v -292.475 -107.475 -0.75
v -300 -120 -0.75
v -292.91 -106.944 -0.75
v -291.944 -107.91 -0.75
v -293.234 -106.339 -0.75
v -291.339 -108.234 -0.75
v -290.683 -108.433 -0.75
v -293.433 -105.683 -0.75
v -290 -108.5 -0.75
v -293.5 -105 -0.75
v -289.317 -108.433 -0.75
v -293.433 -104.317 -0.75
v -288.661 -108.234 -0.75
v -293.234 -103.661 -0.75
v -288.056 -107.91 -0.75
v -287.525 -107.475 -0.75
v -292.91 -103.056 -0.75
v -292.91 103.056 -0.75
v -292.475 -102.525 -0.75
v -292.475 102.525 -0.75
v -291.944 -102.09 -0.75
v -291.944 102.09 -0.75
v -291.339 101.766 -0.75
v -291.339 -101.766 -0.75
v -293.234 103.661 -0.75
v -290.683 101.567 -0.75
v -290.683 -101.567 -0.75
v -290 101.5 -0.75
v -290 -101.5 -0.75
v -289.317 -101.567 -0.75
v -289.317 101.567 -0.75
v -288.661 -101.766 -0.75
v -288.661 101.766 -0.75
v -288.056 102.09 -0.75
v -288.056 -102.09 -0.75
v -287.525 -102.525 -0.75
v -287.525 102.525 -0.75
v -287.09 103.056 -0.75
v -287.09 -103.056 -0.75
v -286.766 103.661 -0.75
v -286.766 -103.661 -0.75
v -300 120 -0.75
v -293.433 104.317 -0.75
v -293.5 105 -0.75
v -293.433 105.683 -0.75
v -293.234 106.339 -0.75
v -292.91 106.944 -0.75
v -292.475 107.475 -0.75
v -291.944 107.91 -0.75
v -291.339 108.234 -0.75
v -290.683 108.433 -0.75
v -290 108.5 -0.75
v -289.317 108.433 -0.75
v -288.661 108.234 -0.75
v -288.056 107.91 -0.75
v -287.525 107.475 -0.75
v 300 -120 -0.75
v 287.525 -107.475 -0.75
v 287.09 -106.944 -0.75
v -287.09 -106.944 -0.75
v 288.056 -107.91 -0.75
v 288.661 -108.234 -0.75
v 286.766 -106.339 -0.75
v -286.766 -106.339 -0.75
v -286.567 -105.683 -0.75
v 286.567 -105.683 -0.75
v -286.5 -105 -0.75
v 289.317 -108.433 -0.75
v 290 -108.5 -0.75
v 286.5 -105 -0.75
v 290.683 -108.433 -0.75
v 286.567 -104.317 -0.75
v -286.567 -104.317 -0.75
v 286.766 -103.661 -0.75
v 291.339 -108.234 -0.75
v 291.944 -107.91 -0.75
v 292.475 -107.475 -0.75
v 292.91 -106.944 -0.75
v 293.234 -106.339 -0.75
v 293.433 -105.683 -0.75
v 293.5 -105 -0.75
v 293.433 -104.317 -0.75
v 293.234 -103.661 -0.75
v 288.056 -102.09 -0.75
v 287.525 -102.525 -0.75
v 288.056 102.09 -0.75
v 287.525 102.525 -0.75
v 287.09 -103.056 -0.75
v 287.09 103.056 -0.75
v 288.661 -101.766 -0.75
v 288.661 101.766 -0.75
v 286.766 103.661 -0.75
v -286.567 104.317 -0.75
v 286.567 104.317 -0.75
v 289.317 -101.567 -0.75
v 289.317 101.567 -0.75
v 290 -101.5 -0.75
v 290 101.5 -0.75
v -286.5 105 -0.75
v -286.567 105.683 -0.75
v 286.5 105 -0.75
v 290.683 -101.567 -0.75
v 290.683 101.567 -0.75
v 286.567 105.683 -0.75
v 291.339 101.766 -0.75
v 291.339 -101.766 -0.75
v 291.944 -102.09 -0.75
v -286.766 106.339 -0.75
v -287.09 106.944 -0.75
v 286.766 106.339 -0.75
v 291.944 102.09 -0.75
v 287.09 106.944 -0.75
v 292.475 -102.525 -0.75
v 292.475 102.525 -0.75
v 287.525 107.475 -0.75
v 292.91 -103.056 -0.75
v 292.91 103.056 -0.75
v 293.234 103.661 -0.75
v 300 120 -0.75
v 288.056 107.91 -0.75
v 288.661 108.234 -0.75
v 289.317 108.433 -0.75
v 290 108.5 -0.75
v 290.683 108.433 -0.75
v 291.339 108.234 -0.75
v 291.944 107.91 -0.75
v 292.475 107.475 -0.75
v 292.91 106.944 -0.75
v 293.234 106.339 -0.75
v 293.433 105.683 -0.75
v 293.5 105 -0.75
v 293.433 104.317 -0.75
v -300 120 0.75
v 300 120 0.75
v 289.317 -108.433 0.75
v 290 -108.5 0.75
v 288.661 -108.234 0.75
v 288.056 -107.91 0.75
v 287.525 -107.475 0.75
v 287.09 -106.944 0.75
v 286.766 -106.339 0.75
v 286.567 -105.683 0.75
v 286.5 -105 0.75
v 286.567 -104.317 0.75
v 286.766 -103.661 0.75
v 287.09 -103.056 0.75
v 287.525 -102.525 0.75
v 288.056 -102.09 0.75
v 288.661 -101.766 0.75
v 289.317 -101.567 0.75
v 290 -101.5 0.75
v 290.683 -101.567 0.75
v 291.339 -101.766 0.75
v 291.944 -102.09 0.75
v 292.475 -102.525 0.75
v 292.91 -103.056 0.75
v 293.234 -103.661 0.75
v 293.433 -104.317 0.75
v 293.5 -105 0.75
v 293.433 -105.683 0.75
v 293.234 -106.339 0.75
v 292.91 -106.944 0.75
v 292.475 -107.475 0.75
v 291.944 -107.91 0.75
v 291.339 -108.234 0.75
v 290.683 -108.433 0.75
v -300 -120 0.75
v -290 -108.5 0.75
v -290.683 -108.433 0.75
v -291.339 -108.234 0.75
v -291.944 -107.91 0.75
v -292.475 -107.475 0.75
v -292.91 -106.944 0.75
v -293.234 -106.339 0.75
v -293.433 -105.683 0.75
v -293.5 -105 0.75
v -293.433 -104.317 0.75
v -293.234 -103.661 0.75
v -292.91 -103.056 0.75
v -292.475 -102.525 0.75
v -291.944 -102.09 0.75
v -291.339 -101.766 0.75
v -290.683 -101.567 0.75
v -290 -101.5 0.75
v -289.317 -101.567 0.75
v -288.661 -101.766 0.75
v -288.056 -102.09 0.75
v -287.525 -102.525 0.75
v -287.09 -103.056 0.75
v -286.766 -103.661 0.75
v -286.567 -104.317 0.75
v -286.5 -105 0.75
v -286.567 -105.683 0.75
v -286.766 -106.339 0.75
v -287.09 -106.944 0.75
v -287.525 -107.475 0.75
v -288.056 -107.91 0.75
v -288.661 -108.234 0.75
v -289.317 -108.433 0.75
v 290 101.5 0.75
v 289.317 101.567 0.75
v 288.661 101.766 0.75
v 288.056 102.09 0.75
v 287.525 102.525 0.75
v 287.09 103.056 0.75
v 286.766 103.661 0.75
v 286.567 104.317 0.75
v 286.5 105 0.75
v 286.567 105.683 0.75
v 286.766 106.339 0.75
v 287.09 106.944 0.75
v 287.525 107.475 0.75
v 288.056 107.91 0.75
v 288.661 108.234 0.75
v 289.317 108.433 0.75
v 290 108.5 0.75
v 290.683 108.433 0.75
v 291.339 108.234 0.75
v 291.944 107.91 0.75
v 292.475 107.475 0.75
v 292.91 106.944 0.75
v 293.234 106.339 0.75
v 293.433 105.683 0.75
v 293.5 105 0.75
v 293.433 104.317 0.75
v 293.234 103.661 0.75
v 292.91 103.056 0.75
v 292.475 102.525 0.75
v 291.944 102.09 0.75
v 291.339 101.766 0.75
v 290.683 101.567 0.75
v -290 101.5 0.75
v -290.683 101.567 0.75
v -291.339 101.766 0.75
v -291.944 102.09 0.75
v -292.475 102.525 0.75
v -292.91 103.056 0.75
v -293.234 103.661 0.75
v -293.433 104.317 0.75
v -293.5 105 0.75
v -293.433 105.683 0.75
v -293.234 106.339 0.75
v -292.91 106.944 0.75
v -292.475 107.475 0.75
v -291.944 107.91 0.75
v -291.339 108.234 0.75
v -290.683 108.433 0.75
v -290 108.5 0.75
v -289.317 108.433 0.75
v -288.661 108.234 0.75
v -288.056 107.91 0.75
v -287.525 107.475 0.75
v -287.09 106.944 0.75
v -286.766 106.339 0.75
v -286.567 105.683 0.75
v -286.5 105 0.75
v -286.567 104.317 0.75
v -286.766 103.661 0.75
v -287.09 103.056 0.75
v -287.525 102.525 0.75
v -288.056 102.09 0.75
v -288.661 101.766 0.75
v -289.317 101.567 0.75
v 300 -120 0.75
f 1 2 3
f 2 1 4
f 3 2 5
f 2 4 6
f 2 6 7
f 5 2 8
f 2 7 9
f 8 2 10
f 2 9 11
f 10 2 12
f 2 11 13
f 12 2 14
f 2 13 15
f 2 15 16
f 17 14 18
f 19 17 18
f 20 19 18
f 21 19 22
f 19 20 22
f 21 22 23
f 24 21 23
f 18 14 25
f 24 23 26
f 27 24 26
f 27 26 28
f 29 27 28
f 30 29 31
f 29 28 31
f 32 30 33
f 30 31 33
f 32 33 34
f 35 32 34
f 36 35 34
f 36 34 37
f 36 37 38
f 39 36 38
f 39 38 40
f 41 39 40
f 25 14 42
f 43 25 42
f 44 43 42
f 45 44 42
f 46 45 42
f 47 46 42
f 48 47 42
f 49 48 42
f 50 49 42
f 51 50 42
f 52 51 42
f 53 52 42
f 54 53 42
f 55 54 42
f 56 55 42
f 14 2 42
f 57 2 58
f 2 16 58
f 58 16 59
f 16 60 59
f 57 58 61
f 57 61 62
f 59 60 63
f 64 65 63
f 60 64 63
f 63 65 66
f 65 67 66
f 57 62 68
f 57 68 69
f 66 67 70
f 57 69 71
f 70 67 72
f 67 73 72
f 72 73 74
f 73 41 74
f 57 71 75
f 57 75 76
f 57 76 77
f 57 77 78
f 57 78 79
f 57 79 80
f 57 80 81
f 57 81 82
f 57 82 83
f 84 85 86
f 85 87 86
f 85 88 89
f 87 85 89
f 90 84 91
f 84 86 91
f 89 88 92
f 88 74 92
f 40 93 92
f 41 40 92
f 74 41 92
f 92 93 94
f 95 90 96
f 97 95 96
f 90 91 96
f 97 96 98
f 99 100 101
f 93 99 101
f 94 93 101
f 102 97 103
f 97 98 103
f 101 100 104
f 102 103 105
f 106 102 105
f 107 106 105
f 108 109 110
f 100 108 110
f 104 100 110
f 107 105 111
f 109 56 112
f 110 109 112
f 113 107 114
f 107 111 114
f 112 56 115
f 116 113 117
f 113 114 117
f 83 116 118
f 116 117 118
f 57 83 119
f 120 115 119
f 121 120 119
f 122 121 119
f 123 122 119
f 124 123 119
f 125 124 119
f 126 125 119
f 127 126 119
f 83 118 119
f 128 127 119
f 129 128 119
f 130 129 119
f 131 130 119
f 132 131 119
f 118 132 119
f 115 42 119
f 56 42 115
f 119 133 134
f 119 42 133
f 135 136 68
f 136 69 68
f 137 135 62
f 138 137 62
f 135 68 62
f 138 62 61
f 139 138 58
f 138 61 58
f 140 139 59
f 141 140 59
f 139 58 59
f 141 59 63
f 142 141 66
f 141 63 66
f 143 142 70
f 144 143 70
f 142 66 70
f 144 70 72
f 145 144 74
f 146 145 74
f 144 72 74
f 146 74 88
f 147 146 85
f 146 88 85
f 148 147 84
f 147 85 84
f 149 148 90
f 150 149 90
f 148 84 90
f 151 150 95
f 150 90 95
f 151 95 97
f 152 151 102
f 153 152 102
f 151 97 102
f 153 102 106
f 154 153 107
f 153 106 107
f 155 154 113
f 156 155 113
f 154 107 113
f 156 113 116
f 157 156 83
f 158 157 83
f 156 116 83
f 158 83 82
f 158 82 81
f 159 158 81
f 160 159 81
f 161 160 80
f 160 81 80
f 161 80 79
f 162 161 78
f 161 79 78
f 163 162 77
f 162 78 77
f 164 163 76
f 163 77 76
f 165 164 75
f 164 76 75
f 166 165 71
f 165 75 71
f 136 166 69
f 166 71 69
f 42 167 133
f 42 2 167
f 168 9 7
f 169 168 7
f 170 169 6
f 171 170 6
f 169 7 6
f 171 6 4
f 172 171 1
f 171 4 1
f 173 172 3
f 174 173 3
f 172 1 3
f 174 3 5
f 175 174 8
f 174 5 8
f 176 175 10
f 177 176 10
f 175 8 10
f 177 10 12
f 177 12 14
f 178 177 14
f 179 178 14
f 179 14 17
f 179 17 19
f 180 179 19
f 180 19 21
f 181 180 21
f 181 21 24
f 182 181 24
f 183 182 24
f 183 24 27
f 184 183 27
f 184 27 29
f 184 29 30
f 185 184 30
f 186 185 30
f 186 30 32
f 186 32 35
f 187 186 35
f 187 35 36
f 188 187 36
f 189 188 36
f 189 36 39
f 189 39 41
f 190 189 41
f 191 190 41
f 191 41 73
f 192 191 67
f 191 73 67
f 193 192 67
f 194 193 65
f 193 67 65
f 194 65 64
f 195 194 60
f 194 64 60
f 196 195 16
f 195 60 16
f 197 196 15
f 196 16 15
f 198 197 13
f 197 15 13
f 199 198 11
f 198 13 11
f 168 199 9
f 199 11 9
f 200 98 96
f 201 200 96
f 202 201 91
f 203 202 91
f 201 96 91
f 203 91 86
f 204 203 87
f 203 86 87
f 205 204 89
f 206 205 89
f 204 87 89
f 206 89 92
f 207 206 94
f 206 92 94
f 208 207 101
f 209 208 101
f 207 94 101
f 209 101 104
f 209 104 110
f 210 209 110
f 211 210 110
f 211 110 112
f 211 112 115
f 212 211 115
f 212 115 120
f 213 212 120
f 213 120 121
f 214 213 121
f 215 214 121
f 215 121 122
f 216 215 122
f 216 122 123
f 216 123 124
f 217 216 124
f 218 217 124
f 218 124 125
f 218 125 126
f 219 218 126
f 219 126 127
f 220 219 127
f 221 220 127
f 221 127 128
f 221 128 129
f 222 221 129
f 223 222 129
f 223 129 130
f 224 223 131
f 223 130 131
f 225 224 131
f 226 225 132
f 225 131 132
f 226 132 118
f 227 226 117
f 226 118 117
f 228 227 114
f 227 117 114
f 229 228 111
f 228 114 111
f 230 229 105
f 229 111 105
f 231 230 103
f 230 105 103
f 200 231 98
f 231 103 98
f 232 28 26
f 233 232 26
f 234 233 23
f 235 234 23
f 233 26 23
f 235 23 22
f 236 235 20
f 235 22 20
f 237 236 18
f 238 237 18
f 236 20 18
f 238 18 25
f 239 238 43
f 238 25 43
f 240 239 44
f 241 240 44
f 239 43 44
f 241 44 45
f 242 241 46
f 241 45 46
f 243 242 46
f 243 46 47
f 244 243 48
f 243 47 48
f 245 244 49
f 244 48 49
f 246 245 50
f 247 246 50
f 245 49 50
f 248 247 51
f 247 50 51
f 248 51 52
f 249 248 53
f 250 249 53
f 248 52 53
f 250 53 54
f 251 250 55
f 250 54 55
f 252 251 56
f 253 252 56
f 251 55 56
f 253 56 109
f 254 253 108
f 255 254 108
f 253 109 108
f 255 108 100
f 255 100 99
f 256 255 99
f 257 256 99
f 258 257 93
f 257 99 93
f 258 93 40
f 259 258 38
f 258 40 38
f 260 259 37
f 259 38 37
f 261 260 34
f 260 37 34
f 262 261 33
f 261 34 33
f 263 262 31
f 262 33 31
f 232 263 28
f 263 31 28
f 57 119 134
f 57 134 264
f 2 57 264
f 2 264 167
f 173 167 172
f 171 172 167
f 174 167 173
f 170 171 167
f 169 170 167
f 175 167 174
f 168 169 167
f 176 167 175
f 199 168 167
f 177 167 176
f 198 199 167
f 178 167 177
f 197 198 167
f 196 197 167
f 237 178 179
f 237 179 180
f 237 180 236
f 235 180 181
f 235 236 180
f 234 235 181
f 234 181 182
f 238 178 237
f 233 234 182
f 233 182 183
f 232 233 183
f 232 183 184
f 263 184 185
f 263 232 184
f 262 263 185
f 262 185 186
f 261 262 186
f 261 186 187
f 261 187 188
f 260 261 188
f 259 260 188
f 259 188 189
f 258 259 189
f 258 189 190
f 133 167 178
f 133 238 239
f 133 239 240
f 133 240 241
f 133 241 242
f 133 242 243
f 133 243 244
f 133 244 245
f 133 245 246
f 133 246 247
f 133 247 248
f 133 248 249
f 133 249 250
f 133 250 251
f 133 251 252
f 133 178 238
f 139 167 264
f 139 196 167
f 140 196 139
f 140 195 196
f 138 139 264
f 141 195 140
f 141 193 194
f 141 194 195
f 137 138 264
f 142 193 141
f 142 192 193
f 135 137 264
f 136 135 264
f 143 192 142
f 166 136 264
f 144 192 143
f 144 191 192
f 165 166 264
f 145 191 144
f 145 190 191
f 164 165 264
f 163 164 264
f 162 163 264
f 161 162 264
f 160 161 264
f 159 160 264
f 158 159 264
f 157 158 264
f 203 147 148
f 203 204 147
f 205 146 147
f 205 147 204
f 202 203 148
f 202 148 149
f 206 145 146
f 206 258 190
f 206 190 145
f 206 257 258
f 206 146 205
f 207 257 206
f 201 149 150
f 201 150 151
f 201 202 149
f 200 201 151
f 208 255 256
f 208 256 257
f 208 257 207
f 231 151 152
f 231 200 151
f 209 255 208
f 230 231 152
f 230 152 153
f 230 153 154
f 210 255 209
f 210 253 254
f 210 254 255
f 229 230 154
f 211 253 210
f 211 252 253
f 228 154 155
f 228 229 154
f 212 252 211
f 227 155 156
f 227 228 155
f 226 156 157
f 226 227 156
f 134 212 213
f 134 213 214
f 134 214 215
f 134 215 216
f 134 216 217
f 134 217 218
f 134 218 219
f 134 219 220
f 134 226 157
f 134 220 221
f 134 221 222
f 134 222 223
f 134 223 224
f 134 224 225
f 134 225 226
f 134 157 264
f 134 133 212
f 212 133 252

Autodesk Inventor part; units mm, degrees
ref_plane "YZ Plane" through (0, 0, 0) normal (1, 0, 0) x (0, 1, 0)
ref_plane "XZ Plane" through (0, 0, 0) normal (0, 1, 0) x (-1, 0, 0)
ref_plane "XY Plane" through (0, 0, 0) normal (0, 0, 1) x (1, 0, 0)
sketch "Sketch1" plane through (0, 0, 0) normal (0, 0, 1) x (1, 0, 0)
  line L0 (-300, 120) -> (300, 120)
  line L1 (300, 120) -> (300, -120)
  line L2 (300, -120) -> (-300, -120)
  line L3 (-300, -120) -> (-300, 120)
  line L4 (-300, 120) -> (300, -120) construction
  line L5 (300, 120) -> (-300, -120) construction
  point P0 (0, 0)
  dimension "d0" = 600
  dimension "d1" = 240
extrude "Plate1" add sketch "Sketch1" along normal mid plane 1.5
sketch "Sketch2" plane through (0, 0, 0.75) normal (0, 0, 1) x (1, 0, 0)
  line L0 (-300, 120) -> (300, 120) projected
  line L1 (-300, -120) -> (-300, 120) projected
  line L2 (300, 120) -> (300, -120) projected
  line L3 (300, -120) -> (-300, -120) projected
  point P0 (0, 0)
  point P1 (-290, 105)
  point P2 (290, 105)
  point P3 (290, -105)
  point P4 (-290, -105)
  dimension "d3" = 15
  dimension "d4" = 10
  dimension "d5" = 10
  dimension "d6" = 15
hole "Hole1" at (-290, 105, 0.75) at (290, 105, 0.75) at (290, -105, 0.75) at (-290, -105, 0.75) direction (0, 0, -1) diameter 7 end through all
equation "\"d12\" = Thickness"
equation "\"d2\" = Thickness"
equation "\"BendRadius\" = Thickness"
equation "\"BendReliefWidth\" = Thickness"
equation "\"BendReliefDepth\" = 0.5 * Thickness"
equation "\"CornerReliefSize\" = 4 * Thickness"
equation "\"MinimumRemnant\" = 2 * Thickness"
equation "\"TransitionRadius\" = BendRadius"
equation "\"JacobiRadiusSize\" = BendRadius"
equation "\"GapSize\" = Thickness"
equation "\"Thickness\" = 1.5"
properties part number "HCMUTE-CDT23-MAT_TRUOT" material "PMMA Plastic"
